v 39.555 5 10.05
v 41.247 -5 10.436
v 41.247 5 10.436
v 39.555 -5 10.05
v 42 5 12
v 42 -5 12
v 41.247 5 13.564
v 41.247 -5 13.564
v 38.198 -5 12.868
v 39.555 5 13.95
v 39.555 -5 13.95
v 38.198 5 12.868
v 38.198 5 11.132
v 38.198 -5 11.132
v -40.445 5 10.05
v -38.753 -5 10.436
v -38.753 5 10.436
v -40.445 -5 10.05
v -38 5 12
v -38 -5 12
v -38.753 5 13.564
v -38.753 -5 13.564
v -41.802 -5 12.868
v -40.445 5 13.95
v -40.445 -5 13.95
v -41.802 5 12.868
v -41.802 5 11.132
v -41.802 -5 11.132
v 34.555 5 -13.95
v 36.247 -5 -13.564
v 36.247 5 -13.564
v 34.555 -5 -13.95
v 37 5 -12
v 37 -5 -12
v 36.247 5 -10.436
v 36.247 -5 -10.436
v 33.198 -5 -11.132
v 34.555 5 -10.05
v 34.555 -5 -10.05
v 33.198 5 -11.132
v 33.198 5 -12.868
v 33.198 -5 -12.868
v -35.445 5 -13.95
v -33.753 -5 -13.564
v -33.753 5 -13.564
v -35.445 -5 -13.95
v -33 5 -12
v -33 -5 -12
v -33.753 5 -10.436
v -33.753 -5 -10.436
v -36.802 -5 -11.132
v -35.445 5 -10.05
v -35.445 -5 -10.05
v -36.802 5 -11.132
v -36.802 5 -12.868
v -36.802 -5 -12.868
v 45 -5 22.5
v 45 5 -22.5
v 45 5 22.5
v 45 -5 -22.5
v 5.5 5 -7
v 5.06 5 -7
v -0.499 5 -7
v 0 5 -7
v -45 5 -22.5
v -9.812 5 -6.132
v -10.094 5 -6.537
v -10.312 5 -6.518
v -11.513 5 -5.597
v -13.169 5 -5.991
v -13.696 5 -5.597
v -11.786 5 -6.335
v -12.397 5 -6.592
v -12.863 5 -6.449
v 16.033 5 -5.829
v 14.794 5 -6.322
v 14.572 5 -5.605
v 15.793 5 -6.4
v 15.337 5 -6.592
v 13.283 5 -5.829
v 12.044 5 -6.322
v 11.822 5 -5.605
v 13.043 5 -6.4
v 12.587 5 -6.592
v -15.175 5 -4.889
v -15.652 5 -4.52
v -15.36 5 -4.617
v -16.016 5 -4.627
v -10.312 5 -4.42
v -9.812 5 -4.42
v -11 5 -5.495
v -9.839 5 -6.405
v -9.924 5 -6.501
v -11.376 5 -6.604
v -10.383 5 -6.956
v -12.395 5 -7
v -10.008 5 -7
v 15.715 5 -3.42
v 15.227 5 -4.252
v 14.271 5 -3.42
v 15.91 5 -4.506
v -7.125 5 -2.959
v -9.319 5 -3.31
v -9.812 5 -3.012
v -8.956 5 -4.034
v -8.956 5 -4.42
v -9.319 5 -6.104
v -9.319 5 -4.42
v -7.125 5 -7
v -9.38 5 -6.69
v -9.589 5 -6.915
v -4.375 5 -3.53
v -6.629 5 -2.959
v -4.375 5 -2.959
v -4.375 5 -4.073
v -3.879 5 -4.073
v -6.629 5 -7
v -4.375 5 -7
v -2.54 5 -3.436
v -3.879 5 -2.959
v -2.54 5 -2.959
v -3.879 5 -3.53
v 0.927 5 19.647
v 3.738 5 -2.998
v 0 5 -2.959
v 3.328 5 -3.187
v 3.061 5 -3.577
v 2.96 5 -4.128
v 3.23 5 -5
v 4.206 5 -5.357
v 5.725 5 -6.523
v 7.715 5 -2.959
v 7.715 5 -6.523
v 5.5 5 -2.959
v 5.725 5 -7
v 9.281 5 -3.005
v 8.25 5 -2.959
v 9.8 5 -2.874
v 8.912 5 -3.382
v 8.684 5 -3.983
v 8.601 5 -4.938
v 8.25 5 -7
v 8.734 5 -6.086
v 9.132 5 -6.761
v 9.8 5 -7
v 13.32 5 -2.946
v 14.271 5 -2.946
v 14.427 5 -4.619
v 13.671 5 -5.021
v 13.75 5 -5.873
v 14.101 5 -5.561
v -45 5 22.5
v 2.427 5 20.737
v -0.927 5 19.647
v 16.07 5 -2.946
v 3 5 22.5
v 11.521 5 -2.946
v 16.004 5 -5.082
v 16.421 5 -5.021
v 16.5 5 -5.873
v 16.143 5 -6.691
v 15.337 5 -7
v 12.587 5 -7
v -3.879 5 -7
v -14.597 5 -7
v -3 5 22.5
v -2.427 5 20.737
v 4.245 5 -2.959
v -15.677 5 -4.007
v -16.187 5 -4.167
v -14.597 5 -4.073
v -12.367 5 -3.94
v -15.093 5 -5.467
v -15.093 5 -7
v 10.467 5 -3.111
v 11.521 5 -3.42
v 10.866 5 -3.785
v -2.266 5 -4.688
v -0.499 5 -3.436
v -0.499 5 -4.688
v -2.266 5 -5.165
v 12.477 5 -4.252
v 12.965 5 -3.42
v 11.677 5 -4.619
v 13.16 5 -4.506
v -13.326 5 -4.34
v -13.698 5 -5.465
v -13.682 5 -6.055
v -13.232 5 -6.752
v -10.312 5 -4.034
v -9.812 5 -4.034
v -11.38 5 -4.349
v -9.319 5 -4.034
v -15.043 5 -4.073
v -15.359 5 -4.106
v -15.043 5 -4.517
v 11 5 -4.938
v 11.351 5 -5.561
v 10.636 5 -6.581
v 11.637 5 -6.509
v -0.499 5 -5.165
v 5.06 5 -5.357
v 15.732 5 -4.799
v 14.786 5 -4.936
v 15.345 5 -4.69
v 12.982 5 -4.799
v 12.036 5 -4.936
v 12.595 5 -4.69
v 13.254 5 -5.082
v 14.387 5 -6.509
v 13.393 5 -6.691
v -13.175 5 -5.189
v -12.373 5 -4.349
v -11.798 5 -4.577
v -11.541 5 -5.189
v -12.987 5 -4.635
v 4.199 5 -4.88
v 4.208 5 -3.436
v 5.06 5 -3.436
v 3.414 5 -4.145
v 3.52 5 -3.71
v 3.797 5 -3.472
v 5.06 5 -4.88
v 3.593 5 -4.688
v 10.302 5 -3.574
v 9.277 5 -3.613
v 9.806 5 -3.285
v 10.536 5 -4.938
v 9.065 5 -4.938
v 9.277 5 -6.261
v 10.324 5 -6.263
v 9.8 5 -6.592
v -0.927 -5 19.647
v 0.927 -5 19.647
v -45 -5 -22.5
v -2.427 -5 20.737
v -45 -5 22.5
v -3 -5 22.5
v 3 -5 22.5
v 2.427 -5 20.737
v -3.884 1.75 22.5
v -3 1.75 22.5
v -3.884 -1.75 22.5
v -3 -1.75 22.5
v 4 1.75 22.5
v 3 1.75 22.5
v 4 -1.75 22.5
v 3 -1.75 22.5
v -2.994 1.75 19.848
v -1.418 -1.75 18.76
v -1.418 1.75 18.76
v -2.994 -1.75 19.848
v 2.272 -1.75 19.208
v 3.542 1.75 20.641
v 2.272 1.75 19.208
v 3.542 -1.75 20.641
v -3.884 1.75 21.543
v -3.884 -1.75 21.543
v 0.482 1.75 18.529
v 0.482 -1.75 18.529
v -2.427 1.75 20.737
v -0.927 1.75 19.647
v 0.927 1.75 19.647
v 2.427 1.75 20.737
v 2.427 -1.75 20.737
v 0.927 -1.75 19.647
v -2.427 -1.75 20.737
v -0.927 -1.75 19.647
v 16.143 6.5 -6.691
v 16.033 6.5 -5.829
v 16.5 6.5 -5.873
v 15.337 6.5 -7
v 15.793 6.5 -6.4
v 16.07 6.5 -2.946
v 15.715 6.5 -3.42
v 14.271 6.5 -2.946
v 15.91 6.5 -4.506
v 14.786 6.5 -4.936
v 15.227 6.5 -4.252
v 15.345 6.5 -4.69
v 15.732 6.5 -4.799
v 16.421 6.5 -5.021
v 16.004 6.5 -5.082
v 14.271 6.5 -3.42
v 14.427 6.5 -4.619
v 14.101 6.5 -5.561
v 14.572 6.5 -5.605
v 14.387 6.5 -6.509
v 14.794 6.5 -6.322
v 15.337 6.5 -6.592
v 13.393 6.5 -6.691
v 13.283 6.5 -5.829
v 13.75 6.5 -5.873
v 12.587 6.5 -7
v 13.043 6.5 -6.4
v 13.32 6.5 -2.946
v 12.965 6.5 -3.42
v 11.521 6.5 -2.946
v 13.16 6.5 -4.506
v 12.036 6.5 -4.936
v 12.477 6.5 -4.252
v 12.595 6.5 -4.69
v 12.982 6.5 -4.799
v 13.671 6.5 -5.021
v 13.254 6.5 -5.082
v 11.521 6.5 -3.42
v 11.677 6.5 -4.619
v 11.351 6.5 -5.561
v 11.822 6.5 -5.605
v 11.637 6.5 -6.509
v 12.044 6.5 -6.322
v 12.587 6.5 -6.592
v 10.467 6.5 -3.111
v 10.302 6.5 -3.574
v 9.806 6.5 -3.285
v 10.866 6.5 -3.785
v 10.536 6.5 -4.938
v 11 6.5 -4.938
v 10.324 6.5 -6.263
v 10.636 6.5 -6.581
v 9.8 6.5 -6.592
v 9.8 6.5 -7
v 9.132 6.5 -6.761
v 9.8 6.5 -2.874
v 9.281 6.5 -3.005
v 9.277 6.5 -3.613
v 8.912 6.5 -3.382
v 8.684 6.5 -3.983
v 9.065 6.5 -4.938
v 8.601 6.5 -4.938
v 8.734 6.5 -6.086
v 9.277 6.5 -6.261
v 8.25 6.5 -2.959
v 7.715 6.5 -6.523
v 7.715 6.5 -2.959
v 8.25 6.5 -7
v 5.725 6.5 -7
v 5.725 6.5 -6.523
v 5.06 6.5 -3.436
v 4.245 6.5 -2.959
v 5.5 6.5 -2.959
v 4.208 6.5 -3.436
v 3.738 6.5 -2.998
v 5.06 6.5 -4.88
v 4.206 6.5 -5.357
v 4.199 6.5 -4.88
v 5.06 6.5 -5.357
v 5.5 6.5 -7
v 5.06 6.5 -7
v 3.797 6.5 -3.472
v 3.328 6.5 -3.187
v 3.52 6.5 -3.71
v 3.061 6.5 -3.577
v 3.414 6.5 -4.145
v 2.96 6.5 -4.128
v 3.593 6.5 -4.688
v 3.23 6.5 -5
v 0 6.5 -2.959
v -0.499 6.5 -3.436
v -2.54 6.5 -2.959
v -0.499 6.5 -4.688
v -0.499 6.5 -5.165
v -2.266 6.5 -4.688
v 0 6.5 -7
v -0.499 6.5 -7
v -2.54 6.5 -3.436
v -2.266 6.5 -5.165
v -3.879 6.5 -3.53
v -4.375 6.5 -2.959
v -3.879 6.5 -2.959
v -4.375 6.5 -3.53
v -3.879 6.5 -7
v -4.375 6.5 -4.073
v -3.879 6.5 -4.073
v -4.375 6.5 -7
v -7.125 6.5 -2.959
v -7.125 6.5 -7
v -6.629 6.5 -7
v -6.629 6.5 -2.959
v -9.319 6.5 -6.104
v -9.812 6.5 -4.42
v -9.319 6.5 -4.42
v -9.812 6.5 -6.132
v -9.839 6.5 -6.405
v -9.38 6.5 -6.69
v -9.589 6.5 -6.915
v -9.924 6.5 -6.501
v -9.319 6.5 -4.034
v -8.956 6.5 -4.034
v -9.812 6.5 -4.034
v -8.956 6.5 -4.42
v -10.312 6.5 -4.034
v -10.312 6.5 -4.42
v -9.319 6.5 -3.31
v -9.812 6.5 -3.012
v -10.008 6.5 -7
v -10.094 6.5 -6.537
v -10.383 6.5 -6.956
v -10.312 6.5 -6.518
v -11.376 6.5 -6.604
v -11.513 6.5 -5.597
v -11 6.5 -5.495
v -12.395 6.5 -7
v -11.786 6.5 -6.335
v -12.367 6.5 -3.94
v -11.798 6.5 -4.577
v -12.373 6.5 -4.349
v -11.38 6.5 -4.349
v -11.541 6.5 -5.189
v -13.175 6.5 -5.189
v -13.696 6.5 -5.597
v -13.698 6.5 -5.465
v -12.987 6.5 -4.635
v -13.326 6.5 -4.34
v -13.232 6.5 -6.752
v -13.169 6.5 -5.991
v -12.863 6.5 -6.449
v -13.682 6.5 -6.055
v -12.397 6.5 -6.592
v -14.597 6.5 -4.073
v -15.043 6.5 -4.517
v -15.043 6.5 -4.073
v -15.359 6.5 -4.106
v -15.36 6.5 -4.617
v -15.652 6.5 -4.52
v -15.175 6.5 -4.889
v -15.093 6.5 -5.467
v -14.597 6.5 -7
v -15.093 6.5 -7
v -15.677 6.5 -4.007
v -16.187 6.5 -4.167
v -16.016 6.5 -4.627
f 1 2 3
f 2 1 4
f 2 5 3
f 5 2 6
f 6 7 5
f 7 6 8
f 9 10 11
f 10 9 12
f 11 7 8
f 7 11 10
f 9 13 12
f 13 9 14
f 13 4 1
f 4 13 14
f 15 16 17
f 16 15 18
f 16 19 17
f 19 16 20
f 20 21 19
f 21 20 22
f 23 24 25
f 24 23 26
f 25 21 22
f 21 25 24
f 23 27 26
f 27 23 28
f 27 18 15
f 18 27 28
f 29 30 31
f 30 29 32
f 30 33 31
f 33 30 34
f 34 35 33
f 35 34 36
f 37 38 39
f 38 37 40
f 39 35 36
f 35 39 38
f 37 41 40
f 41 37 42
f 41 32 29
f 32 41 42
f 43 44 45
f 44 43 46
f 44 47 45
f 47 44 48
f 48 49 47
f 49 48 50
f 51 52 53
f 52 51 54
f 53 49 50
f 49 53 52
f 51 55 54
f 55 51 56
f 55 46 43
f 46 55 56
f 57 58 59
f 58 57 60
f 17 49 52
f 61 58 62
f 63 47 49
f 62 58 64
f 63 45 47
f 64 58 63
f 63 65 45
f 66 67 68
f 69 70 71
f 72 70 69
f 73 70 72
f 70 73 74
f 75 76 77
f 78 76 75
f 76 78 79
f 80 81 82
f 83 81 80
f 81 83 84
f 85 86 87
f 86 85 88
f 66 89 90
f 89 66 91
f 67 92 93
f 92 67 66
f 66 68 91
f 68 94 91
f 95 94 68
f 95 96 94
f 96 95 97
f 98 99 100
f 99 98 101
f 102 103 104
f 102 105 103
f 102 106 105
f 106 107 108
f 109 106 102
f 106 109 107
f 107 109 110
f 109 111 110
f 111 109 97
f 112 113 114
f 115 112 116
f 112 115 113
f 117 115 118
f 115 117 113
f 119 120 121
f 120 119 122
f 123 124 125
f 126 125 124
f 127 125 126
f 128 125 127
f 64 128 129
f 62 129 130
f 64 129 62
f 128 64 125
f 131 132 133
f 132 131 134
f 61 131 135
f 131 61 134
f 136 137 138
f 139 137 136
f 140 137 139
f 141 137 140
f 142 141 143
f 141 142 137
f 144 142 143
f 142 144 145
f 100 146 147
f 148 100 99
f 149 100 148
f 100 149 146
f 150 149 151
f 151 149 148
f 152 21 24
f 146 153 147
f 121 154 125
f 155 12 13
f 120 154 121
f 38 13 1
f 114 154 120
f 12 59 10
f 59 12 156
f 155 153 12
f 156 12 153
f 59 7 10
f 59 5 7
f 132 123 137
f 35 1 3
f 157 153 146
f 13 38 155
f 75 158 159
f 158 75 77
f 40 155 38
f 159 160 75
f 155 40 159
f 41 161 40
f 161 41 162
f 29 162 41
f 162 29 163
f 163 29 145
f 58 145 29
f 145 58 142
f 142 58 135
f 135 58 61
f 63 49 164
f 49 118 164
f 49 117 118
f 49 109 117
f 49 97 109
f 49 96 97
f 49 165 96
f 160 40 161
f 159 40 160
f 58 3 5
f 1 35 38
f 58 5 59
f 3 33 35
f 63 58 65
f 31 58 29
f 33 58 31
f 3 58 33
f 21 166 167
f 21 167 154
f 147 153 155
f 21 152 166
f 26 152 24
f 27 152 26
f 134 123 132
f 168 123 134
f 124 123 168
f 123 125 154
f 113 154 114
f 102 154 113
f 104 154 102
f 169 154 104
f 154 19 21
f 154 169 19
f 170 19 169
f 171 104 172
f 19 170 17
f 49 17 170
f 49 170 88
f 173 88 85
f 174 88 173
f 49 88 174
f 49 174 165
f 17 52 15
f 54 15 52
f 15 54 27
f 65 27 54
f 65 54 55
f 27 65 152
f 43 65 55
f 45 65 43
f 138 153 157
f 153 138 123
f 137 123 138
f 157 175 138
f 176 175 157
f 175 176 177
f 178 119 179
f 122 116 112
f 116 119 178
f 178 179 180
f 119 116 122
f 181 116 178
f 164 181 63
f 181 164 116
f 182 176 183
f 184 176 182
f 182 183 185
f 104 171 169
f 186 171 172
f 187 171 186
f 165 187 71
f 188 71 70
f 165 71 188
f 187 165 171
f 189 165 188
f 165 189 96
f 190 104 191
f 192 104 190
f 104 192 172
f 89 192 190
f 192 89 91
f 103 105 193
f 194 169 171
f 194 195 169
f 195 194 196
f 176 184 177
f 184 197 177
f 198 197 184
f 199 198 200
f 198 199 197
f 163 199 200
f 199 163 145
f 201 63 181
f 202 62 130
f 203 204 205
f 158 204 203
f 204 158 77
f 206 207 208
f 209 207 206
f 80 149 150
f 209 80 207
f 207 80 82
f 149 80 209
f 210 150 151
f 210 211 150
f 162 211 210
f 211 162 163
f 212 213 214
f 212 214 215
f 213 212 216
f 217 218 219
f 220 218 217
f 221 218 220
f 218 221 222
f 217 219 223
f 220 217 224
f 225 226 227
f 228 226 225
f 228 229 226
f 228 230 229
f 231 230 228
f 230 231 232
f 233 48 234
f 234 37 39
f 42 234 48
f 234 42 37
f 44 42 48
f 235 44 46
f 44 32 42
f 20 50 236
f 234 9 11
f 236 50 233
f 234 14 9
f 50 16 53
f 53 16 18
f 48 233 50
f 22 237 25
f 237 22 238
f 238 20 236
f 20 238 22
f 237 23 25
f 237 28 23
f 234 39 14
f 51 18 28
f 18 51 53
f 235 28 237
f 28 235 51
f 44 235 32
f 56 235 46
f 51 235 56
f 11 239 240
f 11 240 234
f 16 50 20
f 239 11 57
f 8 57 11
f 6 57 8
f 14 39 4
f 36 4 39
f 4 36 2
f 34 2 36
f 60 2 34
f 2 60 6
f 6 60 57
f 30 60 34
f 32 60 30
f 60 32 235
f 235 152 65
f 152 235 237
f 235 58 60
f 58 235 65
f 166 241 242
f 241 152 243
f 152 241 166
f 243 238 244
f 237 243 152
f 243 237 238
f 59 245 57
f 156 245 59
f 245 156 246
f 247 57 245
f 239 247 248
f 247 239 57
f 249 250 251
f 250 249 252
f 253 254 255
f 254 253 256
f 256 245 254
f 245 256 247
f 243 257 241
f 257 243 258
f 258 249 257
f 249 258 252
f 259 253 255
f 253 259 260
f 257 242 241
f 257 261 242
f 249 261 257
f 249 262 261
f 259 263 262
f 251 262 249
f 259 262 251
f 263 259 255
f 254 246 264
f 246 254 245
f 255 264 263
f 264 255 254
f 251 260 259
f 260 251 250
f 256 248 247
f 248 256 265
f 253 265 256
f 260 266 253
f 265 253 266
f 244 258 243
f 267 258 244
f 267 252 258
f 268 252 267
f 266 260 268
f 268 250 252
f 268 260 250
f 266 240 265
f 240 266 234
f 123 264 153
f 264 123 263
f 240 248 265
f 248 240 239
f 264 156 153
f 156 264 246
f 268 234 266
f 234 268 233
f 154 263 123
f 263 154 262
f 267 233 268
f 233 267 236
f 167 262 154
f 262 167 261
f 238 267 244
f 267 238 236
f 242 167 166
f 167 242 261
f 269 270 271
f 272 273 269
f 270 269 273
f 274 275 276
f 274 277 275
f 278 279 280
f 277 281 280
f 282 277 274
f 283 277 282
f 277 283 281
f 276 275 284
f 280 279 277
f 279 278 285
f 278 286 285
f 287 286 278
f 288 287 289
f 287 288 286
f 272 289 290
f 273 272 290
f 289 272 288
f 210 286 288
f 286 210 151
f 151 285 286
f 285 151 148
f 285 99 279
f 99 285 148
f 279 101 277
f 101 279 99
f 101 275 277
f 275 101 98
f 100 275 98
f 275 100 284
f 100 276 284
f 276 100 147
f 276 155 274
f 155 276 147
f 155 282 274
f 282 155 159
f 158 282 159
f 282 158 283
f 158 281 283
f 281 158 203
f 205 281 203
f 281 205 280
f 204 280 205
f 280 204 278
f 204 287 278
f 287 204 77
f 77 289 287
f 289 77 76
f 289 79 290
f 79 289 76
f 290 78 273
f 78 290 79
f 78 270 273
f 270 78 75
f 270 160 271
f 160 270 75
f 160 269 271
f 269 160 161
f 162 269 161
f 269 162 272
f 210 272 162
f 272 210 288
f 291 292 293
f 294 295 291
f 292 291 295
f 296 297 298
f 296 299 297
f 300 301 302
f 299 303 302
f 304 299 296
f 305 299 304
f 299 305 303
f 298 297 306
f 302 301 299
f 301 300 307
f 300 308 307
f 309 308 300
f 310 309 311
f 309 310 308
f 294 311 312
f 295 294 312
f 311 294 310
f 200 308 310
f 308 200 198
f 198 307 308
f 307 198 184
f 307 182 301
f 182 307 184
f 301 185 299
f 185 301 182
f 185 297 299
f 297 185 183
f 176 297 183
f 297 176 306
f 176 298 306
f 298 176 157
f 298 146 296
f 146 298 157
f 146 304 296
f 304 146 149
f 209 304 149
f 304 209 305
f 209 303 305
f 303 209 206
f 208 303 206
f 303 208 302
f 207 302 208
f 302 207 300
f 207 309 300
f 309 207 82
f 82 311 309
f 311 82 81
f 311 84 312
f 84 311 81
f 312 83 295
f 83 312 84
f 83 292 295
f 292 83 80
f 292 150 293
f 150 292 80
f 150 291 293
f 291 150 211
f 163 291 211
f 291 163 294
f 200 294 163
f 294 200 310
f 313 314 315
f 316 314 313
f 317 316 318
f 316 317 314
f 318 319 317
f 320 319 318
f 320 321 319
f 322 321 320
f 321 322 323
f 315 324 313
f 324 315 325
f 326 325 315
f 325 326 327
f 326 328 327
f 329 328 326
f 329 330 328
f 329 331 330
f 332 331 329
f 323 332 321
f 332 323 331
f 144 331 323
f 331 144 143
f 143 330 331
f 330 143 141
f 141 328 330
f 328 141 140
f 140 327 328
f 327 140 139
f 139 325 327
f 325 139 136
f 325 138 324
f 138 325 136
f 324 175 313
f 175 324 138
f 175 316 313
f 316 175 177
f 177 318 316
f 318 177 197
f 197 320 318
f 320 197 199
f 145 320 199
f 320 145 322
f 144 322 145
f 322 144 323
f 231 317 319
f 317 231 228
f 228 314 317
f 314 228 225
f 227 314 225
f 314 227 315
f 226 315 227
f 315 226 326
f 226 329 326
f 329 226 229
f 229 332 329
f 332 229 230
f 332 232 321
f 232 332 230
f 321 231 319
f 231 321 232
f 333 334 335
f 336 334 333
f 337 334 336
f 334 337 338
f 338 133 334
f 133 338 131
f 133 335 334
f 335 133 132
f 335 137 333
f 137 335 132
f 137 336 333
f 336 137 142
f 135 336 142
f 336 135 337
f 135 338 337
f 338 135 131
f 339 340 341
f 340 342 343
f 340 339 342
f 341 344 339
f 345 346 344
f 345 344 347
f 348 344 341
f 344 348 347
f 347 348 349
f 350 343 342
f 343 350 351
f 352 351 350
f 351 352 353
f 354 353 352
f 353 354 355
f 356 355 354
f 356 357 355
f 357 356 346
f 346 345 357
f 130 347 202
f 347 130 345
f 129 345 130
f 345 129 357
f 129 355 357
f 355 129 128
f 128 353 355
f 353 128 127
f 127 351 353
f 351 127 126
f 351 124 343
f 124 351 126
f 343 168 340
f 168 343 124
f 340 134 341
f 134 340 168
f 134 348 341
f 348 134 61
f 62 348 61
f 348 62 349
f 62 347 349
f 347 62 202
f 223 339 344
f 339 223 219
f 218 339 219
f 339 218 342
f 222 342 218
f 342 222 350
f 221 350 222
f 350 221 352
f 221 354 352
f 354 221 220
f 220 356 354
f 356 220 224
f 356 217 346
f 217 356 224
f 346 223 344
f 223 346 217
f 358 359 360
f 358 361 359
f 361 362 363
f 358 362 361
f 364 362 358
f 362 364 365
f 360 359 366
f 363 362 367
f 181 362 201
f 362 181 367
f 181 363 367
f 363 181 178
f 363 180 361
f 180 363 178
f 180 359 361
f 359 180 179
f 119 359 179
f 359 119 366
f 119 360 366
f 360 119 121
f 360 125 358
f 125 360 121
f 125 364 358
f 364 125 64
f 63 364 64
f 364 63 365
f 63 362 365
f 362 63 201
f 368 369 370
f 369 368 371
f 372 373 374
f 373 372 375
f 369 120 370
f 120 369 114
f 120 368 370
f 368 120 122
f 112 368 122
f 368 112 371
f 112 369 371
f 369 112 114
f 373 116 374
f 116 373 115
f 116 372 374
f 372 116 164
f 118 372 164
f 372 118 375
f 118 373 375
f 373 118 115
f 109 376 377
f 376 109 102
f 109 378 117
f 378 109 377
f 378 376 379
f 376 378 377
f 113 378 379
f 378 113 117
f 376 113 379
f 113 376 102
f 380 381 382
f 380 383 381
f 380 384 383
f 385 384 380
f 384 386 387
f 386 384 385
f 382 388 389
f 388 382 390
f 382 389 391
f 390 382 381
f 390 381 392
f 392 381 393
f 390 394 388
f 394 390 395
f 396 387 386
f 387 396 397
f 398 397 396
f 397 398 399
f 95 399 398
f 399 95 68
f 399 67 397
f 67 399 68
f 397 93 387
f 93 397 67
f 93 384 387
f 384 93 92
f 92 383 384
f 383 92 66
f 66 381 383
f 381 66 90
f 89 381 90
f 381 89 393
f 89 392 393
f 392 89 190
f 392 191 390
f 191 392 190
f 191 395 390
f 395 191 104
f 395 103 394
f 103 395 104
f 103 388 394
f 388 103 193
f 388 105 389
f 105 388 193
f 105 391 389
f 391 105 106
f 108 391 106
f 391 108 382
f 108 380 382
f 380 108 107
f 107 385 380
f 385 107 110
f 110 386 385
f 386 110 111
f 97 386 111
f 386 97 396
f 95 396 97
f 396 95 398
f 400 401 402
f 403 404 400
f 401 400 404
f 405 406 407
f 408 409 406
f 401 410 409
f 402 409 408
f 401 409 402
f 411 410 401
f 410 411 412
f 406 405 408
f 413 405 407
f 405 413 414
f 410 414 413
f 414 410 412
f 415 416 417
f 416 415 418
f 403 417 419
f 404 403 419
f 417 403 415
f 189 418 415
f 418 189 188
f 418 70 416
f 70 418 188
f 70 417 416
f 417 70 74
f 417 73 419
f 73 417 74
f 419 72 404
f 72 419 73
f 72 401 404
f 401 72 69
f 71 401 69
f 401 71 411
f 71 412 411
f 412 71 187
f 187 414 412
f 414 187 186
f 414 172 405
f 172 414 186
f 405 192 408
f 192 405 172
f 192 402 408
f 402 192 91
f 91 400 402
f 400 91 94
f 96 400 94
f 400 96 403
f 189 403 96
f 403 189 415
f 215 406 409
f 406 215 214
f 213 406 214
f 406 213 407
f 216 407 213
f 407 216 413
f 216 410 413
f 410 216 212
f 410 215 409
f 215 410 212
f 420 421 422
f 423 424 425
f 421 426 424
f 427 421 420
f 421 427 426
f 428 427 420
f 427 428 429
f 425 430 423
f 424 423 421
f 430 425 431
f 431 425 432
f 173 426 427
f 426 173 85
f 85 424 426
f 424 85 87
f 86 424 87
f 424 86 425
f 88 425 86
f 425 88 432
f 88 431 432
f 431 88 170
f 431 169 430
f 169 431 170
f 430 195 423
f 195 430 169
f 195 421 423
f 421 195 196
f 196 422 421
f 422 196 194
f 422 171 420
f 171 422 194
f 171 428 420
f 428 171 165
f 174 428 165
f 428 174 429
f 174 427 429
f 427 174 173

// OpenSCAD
// file: filterMount_screwHoles.scad
module upperScrewHoles(){
	//upperMiddleHalf
	translate([40,12,0]) cylinder(h=30,r=2,center=true);
	translate([-40,12,0]) cylinder(h=30,r=2,center=true);
	//upperHalf
	translate([35,-12,0]) cylinder(h=30,r=2,center=true);
	translate([-35,-12,0]) cylinder(h=30,r=2,center=true);
}

module lowerScrewHoles(){
	//lowerMiddleHalf
	translate([40,-12,0]) cylinder(h=30,r=2,center=true);
	translate([-40,-12,0]) cylinder(h=30,r=2,center=true);
	//bottomwHalf
	translate([35,12,0]) cylinder(h=30,r=2,center=true);
	translate([-35,12,0]) cylinder(h=30,r=2,center=true);
}

upperScrewHoles();
lowerScrewHoles();
// main file
use <write.scad>
use <filterMount_screwHoles.scad>

module 550LP_filterMountBottom(){
	//550LP Filter Mount Bottom
	difference(){
		//mountBody
		color([.2,.1,.6]) cube(size=[90,45,10],center=true);
		//filterBody
		translate([0,-22.5,0]) cylinder(h=3.5,r=4,center=true);
		//filterHole
		translate([0,-22.5,0]) cylinder(h=30,r=3,center=true);
		//screwHoles
		lowerScrewHoles();
	}
	rotate(180,0,0){
		translate([0,-5,5]){
			write("550LP Filter",h=4,t=3,center=true);
		}
	}
}

rotate([-90,0,0]) {
	translate([0,0,0]){
		550LP_filterMountBottom();
	}
}
